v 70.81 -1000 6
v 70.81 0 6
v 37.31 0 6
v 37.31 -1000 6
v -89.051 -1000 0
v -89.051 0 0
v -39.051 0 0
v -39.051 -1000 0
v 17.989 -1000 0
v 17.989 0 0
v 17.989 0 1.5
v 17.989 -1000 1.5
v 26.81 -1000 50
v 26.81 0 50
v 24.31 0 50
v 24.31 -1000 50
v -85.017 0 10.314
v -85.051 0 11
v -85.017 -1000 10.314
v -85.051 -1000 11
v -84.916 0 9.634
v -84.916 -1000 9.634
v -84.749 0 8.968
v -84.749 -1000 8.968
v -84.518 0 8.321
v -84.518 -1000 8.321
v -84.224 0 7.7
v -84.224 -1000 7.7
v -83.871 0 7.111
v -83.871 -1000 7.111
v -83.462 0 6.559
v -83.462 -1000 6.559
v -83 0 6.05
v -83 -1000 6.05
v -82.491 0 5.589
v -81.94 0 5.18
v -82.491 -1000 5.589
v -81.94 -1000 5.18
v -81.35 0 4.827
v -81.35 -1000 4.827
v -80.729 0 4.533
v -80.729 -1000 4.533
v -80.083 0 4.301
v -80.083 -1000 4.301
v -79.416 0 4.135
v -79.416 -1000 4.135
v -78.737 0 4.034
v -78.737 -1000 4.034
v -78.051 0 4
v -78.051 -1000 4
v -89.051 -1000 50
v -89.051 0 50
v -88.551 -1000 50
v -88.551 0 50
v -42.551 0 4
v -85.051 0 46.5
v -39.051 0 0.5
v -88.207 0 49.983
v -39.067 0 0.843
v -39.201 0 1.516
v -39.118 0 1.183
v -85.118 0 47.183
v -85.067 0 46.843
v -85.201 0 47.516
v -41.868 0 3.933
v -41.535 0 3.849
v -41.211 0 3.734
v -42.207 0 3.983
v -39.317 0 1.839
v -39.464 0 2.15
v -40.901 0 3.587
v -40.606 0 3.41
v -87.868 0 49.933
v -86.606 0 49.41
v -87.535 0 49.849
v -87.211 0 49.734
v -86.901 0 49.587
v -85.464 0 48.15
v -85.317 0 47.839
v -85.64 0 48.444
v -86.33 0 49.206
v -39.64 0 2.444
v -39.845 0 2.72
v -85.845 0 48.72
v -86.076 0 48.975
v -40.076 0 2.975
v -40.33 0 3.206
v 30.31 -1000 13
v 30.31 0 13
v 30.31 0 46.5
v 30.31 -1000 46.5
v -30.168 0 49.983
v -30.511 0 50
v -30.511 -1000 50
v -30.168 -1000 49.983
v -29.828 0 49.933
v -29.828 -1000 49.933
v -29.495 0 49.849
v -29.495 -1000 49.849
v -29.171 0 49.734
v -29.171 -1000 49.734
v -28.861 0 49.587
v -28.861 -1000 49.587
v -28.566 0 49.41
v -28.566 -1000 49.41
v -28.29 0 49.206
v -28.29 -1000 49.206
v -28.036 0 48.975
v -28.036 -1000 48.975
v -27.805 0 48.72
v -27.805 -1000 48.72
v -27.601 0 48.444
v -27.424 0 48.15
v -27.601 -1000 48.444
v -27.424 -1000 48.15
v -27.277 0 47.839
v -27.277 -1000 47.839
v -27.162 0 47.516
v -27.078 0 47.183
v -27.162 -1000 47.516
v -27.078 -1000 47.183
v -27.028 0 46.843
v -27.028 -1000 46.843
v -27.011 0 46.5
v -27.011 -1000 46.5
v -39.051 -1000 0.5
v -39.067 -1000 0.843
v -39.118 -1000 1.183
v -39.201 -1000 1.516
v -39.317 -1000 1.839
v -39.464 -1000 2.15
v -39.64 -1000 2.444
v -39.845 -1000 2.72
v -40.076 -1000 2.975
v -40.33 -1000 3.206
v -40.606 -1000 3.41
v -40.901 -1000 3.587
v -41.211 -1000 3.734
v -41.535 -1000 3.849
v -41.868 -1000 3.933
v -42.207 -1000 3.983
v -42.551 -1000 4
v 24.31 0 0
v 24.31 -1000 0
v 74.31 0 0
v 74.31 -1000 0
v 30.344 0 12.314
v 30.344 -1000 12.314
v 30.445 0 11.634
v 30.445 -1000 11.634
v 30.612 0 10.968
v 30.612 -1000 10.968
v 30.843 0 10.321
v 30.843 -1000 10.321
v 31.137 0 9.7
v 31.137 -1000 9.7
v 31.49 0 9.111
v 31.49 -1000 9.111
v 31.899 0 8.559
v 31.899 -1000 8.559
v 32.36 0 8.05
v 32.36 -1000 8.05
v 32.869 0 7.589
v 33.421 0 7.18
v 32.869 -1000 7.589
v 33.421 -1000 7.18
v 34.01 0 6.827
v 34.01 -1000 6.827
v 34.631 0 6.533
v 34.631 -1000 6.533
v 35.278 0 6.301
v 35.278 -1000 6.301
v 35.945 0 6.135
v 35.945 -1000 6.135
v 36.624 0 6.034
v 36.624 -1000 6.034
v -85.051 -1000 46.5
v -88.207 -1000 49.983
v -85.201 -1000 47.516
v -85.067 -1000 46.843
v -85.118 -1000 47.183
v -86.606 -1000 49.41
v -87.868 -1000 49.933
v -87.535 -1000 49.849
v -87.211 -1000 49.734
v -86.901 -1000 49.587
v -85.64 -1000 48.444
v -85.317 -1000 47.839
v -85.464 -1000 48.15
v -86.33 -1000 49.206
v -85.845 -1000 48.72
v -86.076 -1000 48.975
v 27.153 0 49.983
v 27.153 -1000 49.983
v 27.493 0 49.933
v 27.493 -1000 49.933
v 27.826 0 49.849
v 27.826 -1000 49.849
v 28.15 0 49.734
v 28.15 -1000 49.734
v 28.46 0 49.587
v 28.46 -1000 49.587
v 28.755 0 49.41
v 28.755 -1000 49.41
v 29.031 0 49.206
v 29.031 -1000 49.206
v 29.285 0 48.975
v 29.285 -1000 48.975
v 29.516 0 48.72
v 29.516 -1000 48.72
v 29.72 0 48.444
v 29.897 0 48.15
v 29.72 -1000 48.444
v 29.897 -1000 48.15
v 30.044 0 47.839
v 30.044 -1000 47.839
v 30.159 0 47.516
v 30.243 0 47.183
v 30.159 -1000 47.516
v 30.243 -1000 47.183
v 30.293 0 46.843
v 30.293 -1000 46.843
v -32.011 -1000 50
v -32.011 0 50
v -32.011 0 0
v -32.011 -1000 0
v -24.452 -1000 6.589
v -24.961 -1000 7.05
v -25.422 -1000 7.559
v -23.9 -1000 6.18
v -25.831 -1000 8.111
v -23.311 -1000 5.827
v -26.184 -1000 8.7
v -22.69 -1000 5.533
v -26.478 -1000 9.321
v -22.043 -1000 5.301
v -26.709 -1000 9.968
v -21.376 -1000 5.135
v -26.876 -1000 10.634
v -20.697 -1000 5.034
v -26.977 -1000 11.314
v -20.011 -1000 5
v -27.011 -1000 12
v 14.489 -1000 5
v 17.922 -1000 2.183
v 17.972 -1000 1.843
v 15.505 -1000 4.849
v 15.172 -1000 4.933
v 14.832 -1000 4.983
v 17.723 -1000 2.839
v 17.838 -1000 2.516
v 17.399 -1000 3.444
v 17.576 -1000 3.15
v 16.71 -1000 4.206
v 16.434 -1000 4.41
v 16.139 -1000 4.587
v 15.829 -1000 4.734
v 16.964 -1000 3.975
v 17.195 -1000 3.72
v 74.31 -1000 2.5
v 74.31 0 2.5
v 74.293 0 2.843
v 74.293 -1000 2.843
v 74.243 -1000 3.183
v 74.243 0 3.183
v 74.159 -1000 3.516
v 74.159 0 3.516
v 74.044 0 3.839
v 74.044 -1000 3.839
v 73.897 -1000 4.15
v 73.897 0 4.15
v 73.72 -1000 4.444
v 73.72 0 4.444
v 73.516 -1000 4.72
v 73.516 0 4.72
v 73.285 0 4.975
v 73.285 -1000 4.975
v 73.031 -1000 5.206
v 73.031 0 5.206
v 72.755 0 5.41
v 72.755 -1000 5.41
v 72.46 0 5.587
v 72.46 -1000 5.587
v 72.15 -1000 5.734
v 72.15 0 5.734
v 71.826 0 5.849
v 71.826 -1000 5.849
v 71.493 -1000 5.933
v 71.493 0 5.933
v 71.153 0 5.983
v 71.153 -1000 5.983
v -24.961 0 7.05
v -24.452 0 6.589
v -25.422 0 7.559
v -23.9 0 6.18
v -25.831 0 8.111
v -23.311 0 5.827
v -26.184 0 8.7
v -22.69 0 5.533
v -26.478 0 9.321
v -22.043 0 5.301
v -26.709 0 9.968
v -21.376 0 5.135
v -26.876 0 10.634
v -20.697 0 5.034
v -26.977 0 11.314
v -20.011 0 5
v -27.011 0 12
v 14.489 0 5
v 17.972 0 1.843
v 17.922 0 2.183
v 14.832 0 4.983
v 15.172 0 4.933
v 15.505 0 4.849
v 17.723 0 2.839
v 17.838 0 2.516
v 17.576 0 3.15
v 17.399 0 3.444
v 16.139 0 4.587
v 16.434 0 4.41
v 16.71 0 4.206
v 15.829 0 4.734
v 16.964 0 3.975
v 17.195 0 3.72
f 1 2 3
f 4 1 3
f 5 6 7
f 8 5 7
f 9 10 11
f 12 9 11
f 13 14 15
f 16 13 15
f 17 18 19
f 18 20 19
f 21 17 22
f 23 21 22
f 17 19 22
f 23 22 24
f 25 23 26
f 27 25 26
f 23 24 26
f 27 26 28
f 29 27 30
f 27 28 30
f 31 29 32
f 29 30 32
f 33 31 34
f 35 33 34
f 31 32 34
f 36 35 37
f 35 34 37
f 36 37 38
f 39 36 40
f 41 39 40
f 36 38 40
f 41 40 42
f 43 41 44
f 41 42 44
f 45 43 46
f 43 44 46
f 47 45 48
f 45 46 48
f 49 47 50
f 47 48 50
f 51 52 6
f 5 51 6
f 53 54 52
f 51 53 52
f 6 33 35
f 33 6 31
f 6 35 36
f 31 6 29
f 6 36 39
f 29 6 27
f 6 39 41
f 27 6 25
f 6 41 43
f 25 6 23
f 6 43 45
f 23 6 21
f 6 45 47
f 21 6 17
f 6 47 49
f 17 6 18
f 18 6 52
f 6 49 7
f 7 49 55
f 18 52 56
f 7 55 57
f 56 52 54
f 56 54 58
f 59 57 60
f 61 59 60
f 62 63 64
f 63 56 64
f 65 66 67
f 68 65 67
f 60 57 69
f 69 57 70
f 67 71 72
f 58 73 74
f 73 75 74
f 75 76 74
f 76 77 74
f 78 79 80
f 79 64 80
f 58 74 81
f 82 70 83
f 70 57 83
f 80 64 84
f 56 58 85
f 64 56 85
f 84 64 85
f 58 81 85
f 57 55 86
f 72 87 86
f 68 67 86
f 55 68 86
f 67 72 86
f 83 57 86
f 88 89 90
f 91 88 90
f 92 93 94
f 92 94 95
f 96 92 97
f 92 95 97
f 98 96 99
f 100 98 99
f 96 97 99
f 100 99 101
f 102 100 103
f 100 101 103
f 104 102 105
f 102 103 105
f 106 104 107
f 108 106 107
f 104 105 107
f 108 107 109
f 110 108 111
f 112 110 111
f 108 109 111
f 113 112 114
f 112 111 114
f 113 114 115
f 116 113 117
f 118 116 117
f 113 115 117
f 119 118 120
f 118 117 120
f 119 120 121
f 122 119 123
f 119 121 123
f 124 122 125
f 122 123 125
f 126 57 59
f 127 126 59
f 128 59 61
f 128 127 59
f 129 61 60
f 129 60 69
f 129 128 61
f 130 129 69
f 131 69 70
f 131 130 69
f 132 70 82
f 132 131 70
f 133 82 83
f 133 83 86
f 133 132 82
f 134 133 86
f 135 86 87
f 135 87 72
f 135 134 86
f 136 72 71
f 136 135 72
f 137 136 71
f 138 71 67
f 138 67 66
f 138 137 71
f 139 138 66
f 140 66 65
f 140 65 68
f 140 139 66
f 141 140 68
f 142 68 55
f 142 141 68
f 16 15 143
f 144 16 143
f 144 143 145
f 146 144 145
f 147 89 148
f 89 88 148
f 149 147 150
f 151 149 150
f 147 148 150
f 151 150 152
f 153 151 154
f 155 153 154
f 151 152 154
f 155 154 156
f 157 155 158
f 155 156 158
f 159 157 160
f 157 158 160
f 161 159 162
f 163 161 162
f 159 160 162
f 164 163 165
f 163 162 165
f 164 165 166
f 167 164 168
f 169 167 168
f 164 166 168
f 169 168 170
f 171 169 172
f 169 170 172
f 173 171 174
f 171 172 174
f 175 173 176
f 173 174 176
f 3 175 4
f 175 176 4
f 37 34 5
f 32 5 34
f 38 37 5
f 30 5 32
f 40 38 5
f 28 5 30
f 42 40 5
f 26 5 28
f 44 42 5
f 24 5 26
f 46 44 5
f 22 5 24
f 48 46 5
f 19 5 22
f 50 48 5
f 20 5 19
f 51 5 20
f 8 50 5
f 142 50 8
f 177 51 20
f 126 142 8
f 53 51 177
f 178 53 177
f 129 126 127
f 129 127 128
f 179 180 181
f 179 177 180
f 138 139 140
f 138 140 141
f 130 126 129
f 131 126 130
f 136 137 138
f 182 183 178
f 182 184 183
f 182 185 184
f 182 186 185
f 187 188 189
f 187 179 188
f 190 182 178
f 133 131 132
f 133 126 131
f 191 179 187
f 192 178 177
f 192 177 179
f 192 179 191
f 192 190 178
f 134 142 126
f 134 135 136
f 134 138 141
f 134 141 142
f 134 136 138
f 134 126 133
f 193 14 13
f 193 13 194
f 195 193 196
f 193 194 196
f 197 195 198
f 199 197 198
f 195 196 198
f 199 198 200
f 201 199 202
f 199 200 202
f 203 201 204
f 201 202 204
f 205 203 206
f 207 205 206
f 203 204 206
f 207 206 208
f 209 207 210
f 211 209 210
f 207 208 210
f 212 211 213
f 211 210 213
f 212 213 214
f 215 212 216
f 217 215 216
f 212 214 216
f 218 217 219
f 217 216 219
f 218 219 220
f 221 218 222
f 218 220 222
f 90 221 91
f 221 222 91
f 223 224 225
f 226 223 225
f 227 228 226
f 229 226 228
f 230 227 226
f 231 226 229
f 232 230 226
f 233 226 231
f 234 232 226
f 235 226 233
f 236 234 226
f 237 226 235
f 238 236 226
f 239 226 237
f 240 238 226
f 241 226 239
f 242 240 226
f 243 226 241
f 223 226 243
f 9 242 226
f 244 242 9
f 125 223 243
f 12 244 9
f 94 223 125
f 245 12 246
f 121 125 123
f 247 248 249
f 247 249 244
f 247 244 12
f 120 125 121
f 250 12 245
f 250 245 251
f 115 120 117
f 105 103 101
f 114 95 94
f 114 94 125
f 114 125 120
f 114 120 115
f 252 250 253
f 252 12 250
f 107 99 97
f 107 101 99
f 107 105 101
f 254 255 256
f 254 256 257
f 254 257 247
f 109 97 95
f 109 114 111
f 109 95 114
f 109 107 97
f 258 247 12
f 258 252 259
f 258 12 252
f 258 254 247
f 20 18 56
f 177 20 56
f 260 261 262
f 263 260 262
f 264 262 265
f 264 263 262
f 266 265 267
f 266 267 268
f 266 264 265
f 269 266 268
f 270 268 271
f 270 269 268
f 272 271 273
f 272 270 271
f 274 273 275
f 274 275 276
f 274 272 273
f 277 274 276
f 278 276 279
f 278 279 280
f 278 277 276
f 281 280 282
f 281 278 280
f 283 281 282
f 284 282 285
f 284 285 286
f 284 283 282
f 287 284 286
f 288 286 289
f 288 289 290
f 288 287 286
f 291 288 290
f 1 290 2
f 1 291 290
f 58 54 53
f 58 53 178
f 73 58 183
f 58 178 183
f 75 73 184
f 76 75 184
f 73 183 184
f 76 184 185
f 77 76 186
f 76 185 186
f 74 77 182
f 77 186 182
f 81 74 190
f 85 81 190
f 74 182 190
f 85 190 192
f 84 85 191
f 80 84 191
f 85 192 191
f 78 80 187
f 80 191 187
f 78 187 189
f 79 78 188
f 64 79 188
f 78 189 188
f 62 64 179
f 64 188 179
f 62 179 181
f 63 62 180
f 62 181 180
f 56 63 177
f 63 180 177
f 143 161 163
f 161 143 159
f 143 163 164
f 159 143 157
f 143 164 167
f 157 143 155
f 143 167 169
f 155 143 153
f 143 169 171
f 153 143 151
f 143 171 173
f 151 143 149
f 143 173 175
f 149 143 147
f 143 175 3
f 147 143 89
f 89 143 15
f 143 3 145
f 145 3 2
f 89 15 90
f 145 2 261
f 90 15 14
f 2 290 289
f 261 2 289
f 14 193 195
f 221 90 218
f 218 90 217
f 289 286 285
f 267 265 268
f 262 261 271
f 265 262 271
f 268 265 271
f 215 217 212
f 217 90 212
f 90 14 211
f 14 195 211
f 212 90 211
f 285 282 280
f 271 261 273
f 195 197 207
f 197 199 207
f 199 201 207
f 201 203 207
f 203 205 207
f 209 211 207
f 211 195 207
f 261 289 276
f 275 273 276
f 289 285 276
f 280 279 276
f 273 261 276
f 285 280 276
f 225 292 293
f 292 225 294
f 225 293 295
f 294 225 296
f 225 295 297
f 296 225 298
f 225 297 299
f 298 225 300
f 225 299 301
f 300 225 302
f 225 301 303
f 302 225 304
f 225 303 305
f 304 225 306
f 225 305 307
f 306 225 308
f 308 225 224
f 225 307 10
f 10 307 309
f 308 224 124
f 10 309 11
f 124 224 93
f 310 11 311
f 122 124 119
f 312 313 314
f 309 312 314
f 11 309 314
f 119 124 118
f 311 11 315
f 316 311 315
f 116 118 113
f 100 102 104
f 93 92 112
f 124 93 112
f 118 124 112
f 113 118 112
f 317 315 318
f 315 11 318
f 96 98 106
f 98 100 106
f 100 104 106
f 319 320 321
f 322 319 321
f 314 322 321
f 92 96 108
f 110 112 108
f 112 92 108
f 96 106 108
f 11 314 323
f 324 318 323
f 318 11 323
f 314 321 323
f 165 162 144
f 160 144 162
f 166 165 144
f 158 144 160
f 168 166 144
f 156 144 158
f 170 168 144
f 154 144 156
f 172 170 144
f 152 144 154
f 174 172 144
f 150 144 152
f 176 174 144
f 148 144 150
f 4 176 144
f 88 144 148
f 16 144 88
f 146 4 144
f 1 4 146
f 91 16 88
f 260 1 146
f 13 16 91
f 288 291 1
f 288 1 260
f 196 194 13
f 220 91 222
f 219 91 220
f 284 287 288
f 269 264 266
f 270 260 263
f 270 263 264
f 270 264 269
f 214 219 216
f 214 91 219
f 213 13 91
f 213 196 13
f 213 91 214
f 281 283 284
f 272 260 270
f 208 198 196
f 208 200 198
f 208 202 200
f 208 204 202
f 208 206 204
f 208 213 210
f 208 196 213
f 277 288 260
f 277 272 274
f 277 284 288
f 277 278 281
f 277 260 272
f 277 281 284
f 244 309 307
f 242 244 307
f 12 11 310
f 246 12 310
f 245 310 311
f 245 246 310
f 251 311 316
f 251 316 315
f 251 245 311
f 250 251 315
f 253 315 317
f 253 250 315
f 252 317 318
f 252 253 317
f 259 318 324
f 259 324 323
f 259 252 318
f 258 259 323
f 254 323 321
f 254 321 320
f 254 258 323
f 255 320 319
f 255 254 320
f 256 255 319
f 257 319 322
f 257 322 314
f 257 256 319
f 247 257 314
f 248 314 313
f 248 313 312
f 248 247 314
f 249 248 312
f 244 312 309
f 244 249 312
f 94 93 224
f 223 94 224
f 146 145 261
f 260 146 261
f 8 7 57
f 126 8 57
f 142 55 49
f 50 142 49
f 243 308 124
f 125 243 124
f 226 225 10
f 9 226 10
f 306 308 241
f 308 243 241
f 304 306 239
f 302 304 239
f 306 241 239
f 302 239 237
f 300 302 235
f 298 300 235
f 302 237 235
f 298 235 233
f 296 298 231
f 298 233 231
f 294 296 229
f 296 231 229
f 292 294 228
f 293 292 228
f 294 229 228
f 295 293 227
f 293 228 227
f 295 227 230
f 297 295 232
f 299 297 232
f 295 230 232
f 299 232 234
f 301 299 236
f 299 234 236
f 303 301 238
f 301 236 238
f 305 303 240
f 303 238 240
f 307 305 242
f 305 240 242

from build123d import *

# Parameters (mm, degrees)
F1_DEPTH = 1000
F2_R     = 3.5
F3_R     = 7
F5_DEPTH = 1000
F6_R     = 3.5
F7_R     = 7
F9_DEPTH = 1000
F10_R    = 3.5
F11_R    = 7


with BuildPart() as f1:
    # F0 (on Front) → F1 (new body)
    with BuildSketch(Plane.XZ):
        Polygon((-85.050546, 50), (-89.050546, 50), (-89.050546, 0), (-39.050546, 0), (-39.050546, 4), (-85.050546, 4), align=None)
    extrude(amount=F1_DEPTH)

    # F2
    f2_edges = [f1.edges().sort_by_distance(p)[0] for p in [
        (-85.050546, -500, 50),
        (-39.050546, -500, 4),
    ]]
    fillet(f2_edges, radius=F2_R)

    # F3
    f3_edges = [f1.edges().sort_by_distance(p)[0] for p in [
        (-85.050546, -500, 4),
    ]]
    fillet(f3_edges, radius=F3_R)


with BuildPart() as f5:
    # F4 (on Front) → F5 (new body)
    with BuildSketch(Plane.XZ):
        Polygon((-27.010812, 50), (-32.010812, 50), (-32.010812, 0), (17.989188, 0), (17.989188, 5), (-27.010812, 5), align=None)
    extrude(amount=F5_DEPTH)

    # F6
    f6_edges = [f5.edges().sort_by_distance(p)[0] for p in [
        (17.989188, -500, 5),
        (-27.010812, -500, 50),
    ]]
    fillet(f6_edges, radius=F6_R)

    # F7
    f7_edges = [f5.edges().sort_by_distance(p)[0] for p in [
        (-27.010812, -500, 5),
    ]]
    fillet(f7_edges, radius=F7_R)


with BuildPart() as f9:
    # F8 (on Front) → F9 (new body)
    with BuildSketch(Plane.XZ):
        Polygon((30.310179, 50), (24.310179, 50), (24.310179, 0), (74.310179, 0), (74.310179, 6), (30.310179, 6), align=None)
    extrude(amount=F9_DEPTH)

    # F10
    f10_edges = [f9.edges().sort_by_distance(p)[0] for p in [
        (30.310179, -500, 50),
        (74.310179, -500, 6),
    ]]
    fillet(f10_edges, radius=F10_R)

    # F11
    f11_edges = [f9.edges().sort_by_distance(p)[0] for p in [
        (30.310179, -500, 6),
    ]]
    fillet(f11_edges, radius=F11_R)


solid = Compound([f1.part, f5.part, f9.part])
